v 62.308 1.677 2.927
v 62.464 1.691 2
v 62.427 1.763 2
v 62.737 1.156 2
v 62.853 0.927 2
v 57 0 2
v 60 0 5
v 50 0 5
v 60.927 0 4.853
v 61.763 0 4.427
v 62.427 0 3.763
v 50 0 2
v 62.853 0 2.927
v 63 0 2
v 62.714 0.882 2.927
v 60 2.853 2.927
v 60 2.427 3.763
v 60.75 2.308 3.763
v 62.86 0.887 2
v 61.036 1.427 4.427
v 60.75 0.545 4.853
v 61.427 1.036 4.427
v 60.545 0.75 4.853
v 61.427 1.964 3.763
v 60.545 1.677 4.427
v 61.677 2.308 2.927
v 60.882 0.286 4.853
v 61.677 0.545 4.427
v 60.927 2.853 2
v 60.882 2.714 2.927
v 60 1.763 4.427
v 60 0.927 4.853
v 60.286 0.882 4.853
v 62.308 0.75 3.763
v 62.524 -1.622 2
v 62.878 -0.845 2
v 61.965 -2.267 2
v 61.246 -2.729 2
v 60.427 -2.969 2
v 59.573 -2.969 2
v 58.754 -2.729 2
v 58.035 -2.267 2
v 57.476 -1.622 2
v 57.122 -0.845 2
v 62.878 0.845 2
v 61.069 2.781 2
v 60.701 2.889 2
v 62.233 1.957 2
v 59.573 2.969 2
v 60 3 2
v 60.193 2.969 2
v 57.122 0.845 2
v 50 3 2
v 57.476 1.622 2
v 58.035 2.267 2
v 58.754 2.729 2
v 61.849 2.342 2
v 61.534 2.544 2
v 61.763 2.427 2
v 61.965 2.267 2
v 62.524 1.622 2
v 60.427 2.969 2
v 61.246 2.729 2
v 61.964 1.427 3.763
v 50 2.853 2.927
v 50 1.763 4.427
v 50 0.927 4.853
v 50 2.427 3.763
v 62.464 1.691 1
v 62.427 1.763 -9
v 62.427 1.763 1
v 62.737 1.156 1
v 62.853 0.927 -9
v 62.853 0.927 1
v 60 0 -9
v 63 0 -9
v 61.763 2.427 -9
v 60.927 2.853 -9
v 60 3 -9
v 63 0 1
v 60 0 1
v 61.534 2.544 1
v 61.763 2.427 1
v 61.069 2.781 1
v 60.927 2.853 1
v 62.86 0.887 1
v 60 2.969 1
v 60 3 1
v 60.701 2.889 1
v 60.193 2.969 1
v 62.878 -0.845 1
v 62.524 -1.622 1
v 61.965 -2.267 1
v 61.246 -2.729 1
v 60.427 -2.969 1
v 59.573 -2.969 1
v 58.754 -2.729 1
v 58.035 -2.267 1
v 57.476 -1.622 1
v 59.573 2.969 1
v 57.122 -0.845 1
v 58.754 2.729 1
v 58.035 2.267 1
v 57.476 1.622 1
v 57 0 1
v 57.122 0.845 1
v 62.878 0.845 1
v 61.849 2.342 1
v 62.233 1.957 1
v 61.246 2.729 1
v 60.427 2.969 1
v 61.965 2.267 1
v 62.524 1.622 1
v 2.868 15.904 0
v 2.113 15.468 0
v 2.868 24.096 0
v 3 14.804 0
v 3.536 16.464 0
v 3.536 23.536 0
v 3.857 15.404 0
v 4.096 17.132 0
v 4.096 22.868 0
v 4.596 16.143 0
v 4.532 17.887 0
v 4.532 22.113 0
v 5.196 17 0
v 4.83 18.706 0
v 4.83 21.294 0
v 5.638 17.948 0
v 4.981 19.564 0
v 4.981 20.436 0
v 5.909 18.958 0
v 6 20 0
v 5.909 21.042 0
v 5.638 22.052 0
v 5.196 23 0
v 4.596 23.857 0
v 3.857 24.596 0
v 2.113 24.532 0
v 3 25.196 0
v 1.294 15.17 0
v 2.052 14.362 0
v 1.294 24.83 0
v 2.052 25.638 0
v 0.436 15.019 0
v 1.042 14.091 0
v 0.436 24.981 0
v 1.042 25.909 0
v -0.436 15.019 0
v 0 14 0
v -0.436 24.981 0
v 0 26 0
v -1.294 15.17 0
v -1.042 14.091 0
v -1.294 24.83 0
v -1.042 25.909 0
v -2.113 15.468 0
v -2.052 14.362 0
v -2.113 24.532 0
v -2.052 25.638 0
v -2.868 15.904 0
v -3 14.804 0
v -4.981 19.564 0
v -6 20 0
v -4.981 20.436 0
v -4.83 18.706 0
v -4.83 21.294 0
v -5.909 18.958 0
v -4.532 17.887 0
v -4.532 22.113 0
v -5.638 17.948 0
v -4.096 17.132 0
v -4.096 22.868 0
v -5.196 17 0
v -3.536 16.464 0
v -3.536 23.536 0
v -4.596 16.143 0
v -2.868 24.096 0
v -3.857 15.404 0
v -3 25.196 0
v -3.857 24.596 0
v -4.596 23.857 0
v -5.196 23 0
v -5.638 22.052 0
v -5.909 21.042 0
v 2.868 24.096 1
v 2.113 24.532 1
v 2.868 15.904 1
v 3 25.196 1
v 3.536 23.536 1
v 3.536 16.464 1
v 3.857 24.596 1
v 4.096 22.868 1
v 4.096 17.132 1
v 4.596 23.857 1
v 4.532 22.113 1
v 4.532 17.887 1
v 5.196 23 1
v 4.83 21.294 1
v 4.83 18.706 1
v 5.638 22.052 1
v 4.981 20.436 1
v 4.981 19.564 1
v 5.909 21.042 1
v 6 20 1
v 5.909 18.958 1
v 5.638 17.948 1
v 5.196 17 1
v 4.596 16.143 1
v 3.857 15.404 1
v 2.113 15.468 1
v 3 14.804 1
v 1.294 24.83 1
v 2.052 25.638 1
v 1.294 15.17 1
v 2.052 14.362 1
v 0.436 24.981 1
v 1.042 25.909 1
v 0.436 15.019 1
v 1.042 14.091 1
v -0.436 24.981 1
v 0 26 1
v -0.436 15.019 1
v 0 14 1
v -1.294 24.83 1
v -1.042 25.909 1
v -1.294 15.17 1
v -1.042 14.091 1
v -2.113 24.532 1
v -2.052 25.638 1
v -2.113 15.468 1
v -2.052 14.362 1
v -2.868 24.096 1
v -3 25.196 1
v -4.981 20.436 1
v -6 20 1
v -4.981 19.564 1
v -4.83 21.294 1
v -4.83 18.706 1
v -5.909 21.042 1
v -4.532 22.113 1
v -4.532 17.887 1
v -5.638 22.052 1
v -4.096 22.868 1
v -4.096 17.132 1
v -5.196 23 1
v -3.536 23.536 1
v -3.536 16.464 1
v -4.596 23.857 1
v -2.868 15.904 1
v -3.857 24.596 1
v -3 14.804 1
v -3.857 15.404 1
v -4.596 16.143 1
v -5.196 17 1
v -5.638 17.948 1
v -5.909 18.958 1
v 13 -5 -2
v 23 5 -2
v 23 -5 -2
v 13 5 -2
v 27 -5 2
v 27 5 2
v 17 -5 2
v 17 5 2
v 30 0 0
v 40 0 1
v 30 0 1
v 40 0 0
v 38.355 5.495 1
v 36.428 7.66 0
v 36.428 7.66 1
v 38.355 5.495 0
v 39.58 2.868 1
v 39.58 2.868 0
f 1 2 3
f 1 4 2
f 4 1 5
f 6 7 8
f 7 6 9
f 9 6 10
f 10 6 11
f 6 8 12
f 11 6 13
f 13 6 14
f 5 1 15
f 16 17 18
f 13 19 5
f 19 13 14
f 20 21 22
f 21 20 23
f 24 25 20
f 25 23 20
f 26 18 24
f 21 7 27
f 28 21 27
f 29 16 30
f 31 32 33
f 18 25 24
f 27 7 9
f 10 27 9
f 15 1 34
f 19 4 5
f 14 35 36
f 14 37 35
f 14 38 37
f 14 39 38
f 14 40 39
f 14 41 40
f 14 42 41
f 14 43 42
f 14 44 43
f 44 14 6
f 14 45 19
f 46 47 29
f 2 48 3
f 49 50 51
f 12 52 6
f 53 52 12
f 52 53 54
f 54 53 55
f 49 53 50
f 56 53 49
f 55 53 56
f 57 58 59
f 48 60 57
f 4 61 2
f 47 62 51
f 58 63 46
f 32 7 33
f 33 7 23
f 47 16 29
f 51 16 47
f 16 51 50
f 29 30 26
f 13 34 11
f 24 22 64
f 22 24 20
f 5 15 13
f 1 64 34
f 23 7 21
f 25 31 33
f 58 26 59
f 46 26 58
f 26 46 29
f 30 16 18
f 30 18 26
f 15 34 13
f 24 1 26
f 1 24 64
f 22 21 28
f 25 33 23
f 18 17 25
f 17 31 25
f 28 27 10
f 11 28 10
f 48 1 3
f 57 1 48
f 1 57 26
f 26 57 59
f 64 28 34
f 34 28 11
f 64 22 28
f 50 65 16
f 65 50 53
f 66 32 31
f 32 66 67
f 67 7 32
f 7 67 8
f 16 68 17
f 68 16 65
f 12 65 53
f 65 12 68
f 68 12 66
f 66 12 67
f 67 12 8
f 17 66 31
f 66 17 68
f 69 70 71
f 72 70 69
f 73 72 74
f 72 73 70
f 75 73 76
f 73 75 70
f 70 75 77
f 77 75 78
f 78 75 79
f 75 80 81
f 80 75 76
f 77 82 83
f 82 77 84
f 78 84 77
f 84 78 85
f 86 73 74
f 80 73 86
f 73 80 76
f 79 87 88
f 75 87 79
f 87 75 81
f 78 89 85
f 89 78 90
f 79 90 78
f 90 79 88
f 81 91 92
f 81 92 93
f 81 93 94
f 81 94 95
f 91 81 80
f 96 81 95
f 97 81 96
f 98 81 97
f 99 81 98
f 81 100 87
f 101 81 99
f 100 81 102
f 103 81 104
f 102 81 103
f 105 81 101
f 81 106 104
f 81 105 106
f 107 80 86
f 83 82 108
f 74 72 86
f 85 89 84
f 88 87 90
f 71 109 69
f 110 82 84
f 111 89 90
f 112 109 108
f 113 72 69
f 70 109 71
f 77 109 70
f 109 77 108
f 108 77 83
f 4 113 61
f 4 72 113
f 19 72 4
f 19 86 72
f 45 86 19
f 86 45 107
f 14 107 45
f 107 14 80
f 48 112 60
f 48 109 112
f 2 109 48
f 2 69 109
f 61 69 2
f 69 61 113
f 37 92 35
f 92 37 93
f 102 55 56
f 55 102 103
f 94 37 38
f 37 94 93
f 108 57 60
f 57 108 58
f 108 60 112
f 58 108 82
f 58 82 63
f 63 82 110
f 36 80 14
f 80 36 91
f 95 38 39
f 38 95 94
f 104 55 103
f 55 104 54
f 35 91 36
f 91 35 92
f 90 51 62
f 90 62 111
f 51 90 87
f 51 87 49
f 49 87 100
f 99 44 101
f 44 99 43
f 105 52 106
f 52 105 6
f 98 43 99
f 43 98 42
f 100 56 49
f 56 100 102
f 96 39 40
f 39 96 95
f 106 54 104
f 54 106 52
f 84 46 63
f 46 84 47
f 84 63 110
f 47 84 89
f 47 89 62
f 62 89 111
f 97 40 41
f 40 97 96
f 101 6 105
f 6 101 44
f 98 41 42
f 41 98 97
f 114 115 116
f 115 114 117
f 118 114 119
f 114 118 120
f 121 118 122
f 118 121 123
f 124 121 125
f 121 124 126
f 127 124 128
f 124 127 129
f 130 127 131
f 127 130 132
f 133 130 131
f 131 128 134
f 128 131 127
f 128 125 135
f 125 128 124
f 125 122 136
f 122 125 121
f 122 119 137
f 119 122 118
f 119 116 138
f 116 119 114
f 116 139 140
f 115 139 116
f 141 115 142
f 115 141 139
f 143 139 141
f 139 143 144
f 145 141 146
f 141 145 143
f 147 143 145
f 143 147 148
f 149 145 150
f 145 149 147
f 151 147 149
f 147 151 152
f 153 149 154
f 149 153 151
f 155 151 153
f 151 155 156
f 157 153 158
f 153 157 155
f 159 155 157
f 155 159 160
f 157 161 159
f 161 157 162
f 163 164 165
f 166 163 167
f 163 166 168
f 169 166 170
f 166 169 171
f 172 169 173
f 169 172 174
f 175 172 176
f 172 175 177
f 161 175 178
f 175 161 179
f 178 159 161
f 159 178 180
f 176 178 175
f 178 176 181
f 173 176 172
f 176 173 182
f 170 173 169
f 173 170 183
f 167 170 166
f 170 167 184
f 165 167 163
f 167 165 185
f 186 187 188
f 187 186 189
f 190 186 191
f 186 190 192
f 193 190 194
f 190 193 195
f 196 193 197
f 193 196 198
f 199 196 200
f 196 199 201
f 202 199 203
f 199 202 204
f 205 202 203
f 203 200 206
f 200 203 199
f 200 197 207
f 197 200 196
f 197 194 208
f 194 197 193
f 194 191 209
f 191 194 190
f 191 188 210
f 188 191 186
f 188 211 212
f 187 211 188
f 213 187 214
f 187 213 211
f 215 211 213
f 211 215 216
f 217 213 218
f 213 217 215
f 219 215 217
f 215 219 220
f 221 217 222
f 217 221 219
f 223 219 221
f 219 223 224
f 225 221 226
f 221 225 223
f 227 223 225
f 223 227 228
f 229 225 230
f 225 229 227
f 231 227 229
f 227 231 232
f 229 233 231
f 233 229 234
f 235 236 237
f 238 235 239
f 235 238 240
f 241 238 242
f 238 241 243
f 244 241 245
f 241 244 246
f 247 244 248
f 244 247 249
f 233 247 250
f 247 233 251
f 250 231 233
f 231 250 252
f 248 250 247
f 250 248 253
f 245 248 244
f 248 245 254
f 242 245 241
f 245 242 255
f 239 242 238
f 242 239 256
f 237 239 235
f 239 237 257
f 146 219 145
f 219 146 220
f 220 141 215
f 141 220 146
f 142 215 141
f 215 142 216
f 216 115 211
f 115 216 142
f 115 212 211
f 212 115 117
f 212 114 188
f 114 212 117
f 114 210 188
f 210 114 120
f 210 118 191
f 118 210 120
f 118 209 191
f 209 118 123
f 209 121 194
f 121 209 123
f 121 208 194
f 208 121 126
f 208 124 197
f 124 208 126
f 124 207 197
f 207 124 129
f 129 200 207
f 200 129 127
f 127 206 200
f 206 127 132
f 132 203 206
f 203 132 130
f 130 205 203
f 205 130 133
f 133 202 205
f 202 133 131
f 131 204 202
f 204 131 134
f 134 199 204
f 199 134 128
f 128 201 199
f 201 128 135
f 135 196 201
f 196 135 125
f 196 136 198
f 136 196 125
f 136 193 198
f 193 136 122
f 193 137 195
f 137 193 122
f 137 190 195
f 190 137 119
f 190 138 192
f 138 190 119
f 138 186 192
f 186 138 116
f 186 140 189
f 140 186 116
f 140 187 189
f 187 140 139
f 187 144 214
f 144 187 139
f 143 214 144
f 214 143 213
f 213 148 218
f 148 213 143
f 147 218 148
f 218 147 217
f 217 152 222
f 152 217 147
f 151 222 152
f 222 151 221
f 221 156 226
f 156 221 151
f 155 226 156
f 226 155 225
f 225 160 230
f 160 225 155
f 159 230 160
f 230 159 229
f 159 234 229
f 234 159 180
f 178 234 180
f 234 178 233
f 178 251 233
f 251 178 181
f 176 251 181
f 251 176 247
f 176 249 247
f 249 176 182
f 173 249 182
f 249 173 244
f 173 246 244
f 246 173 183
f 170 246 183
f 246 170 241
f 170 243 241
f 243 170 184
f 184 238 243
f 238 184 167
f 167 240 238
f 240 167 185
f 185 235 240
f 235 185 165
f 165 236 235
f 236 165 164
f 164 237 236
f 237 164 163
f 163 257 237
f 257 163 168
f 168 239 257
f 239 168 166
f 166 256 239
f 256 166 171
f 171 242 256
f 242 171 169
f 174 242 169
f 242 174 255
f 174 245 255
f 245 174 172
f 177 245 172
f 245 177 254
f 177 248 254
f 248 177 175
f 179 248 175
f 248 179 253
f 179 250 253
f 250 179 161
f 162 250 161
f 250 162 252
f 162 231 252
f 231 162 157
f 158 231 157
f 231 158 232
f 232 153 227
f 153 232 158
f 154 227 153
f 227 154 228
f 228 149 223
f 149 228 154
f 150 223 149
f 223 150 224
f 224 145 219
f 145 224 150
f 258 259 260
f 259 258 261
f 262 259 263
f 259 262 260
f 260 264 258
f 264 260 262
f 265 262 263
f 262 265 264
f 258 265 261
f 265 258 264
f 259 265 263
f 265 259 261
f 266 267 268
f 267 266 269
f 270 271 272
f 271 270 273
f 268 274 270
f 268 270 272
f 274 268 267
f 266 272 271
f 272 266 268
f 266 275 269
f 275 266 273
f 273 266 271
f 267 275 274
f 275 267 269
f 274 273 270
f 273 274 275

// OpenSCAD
translate([0,20,0]) linear_extrude(1) star(N=36,ri=5,re=6);
translate([20,0,0]) skewedCube([10,10,4],[45,0],center=true);
translate([30,0,0]) linear_extrude(1)  arc(r=10, angle=50);
translate([30,30,0]) rotate_extrude() rotate(30) arc(r=10, angle=60);
circFromPoints([[56,32],[61,17],[50,30]],true);
translate([0,0,0]) nGon();
translate([20,20,0]) beanShape(d1=10,d2=7,r=5,dist=10);

//-- compare facet handling of arc with rotate_extrude
//$fs=0.2;


translate([60,0,2]){
   $fn=ceil(rands(0,50,1)[0]);
   color("red") rotate_extrude(angle=90) arc(3,90);
   color("lightblue") rotate([0,-90,0]) rotate_extrude(angle=90) square([3,10]);
   color("lightblue") translate([0,0,-11]) rotate_extrude(angle=90) square([3,10]);
   color("green") translate([0,0,-1]) cylinder(r=3,h=1);
}
/* -- openSCAD's calculation of fragments in a circle
fn: total number of fragments
fa: minimum angle per fragment
fs: minimum size of a fragment

int get_fragments_from_r(double r, double fn, double fs, double fa)
      {
             if (r < GRID_FINE) return 3;
             if (fn > 0.0) return (int)(fn >= 3 ? fn : 3);
             return (int)ceil(fmax(fmin(360.0 / fa, r*2*M_PI / fs), 5));
      }
      defaults: $fn=0; $fa=12, $fs=2
*/
$fn=20;
*rndCube();
module rndCube(size=[1,1,1],rad=0.1,center=false){
  //"for (ix,iy,iz) hull() - sphere()" is very unefficient
  cntrOffset= center ? [0,0,0] : size/2;
  prtRad= (min(size)<=rad*2) ? min(size)/2 : rad; //limit radius to half of shortest side

  translate(cntrOffset) 
   hull() for (ix=[0,1],iy=[0,1],iz=[0,1]){ 
    mirror ([ix,0,0]) mirror([0,iy,0]) mirror([0,0,iz]) 
      translate([(size.x/2-prtRad),(size.y/2-prtRad),(size.z/2-prtRad)]) 
        rotate_extrude(angle=90) arc(prtRad,90);
  }
}


module rndCubeSlow(size=[1,3,3], rad=1.5, center=false){
  //rounded cube
  cntrOffset= center ? [0,0,0] : size/2;
  prtRad= (min(size)<rad) ? min(size)/2 : rad; //limit radius to half of shortest side

  translate(cntrOffset) hull() for (ix=[-1,1], iy=[-1,1], iz=[-1,1])
    translate([ix*(size.x/2-prtRad),iy*(size.y/2-prtRad),iz*(size.z/2-prtRad)]) sphere(prtRad);
}

*rndRect(center=true);
module rndRect(size=[10,10], rad=1, center=false){
  /* square or cube with rounded corners
 accepts 2 or 3 Dimensions 
  */
  if (len(size)==3){
    cntrOffset= center ? [0,0,0] : size/2;    
    hull() for(ix=[-1,1],iy=[-1,1])
      translate([ix*(size.x/2-rad),iy*(size.y/2-rad),0]+cntrOffset) cylinder(r=rad,h=size.z,center=true);
  }
  else{
    cntrOffset= center ? [0,0] : size/2;    
    hull() for(ix=[-1,1],iy=[-1,1])
      translate([ix*(size.x/2-rad),iy*(size.y/2-rad)]+cntrOffset) circle(r=rad);
  }
}

//draw an arc with 2 radiusses
//$fn=50;
*arcDualRad(73,15,12,50);
module arcDualRad(r1,r2,angle1,angle2){
/* two arcs with tangential transistion
/  give: center(M1) and radius(r1) of first arc
/        radius(r2) of 2nd arc
/        angle of both arc segments(alpha1,alpha2)
*/
  //if (M1.x<0) assert("ERROR","x-Values needs to be positive")
  
  alpha=90-angle1;
  M2=[sin(alpha)*(r1-r2),cos(alpha)*(r1-r2)];

  //draw two arcs
  *translate(M1) arc(r1,angle1);
  *translate(M2) rotate(angle1) arc(r2,angle2);
  //calculate fragments for each arc
  n1=arcFragments(r1,angle1);
  n2=arcFragments(r2,angle2);
  //generate Polygons
  arc1Poly=arcPoints(r1,angle1,n1,poly=[]);
  arc2Poly=translatePoints(rotatePoints(arcPoints(r2,angle2,n2,poly=[]),angle1) ,M2);
  //combine and draw polygons
  polygon(concat([[0,0]],arc2Poly,arc1Poly));
  
}

module calcFacets(r=5){
  echo(r=r,n=($fn>0?($fn>=3?$fn:3):ceil(max(min(360/$fa,r*2*PI/$fs),5))),a_based=360/$fa,s_based=r*2*PI/$fs);
}

module arc(r=1,angle=60){
  //draws a closed arc shape from zero to target angle 
  //with same amount of fragments rotate_extrude(angle) would produce but with 2D output

  n= arcFragments(r,angle);
  polygon(arcPoints(r,angle,n));
}


//ri is inner radius and re is outer radius
module star(N=5, ri=15, re=30) {
    polygon([
        for (n = [0 : N-1], in = [true, false])
            in ? 
                [ri*cos(-360*n/N + 360/(N*2)), ri*sin(-360*n/N + 360/(N*2))] :
                [re*cos(-360*n/N), re*sin(-360*n/N)]
    ]);
}

//n-Gon from side length
*nGon();
module nGon(N=5, S=10) {
  //https://calcresource.com/geom-ngon.html
  theta=360/N;
  rc=S/(2*sin(theta/2));
    polygon([
        for (n = [0 : N-1])
                [rc*cos(-360*n/N), rc*sin(-360*n/N)]
    ]);
}

module skewedCube(size=[1,1,1],skew=[45,45],center=false){
  skwDstX= tan(skew.x) ? size.z/tan(skew.x) : 0;
  skwDstY= tan(skew.y) ? size.z/tan(skew.y) : 0;
  skewDist= [skwDstX,skwDstY];
  centerOffset= center ? [-(size.x+skewDist.x)/2,-(size.x+skewDist.y)/2,-size.z/2]: [0,0,0];
  
  polys= // -- bottom --
         [[0,0,0],          //0
         [size.x,0,0],      //1
         [size.x,size.y,0], //2
         [0,size.y,0],      //3
         // -- top --
         [skewDist.x,skewDist.y,size.z],             //4
         [size.x+skewDist.x,skewDist.y,size.z],      //5
         [size.x+skewDist.x,size.y+skewDist.y,size.z], //6
         [skewDist.x,size.y+skewDist.y,size.z]];       //7
  
  faces=[[0,1,2,3],  // bottom
  [4,5,1,0],  // front
  [7,6,5,4],  // top
  [5,6,2,1],  // right
  [6,7,3,2],  // back
  [7,4,0,3]]; // left
  
  translate(centerOffset) polyhedron(polys,faces);
}

// give two or three 2D points to draw a circle
module circFromPoints(points=[],debug=false){
  //using trigonometric approach from
  //https://www.weltderfertigung.de/suchen/lernen/mathematik/punktberechnung-kreismittelpunkt-und-radius.php
  p1=points[0];
  p2=points[1];
  p3=points[2];

  //first triangle from 2 points
  a1=p2.y-p1.y;
  b1=p2.x-p1.x;
  c1=norm(p1-p2); //diameter of first circle

  //center of circle from 2 points
  M1=[p1.x+b1/2,p1.y+a1/2];
  
  //done when only 2 points are given
  if (len(points)==2)
    translate(M1) circle(c/2);

  else{ //continue with radius and center from 3 points
    M=centerFrom3P(points);
    r=radiusFrom3P(points);
    //r=norm(p1-M); //distance between center and one of the points
    translate(M) circle(r);
    if (debug) echo(str("radius: ",r,"\n center: ",M));
  }

  if (debug){
    color("red") translate(p1) circle();
    color("red") translate(p2) circle();
    if (p3) color("red") translate(p3) circle();
   
  }
}

module beanShape(d1=70,d2=50,r=50,dist=70){
  //two circles connected by tangential radius
  //a²=b²+c²-2*b*c*cos(alpha)
  a=r+d2/2;
  b=r+d1/2;
  c=dist;
  alpha=acos((a^2-b^2-c^2)/(-2*b*c));
  beta=acos((b^2-a^2-c^2)/(-2*a*c));
  echo(beta);
  
  Prad=[cos(alpha)*b,sin(alpha)*b];
  P1=[cos(alpha)*d1/2,sin(alpha)*d1/2];
  P2=[-cos(beta)*d2/2,sin(beta)*d2/2];
  
  difference(){
    union(){
      circle(d=d1);
      translate([dist,0]) circle(d=d2);
      polygon([P1,[P2.x+dist,P2.y],[P2.x+dist,-P2.y],[P1.x,-P1.y]]);
    }
    translate(Prad) circle(r);
    translate([Prad.x,-Prad.y]) circle(r);
  }
}


// --- functions ---

function centerFrom3P(points=[])=
//using trigonometric approach from
//https://www.weltderfertigung.de/suchen/lernen/mathematik/punktberechnung-kreismittelpunkt-und-radius.php

  let(
    p1=points[0],
    p2=points[1],
    p3=points[2],

    //first triangle from 2 points
    a1=p2.y-p1.y,
    b1=p2.x-p1.x,
    c1=norm(p1-p2), //diameter of first circle

    //center of circle from 2 points
    M1=[p1.x+b1/2,p1.y+a1/2],

    a2=p3.y-p1.y,
    b2=p3.x-p1.x,
    c2=norm(p1-p3), //diameter of 2nd circle
    M2=[p1.x+b2/2,p1.y+a2/2],

    a3=p3.y-p2.y,
    b3=p3.x-p2.x,

    M3=[p2.x+b3/2,p2.y+a3/2],

    W1=atan2(a1,b1),
    W2=atan2((M3.y-M1.y),(M3.x-M1.x)),
    W3=atan2((p2.y-M3.y),(p3.x-M3.x)),
    W4=atan2((M3.y-M1.y),(M3.x-M1.x)),

    beta=90-(W1-W2),
    gamma=90-W3-W4,
    alpha=180-beta-gamma,
    a=norm(M3-M1),
    c=(a*sin(gamma))/sin(alpha),
    alpha2=90-(beta-W2),
    M1M=[sin(alpha2)*c,cos(alpha2)*c]//Offset between M1 and M
  ) [M1.x+M1M.x,M1.y-M1M.y]; //M

echo(radiusFrom3P([[-48.08,-19.65],[-50.38, -20.86],[ -52.50, -25.43]]));

function radiusFrom3P(points)=
  norm(points[0]-centerFrom3P(points));

function angleFrom2P(points,radius=1)=
  2*asin(norm(points[0]-points[1])/(2*radius));

//arc with constant radius
function arcPoints(r=1,angle=60,steps=10,poly=[[0,0]],iter)=
  let(
    iter = (iter == undef) ? steps-1 : iter,
    angInc=angle/(steps-1), //increment per step
    x= r*cos(angInc*iter),
    y= r*sin(angInc*iter)
  )(iter>=0) ? arcPoints(r,angle,steps,concat(poly,[[x,y]]),iter-1) : poly;

*offset(3) union(){
  polygon(arcPointsLinear(3,6,180,30));
  rotate(180) polygon(arcPointsLinear(6,3,180,30));
}

//arc with linear radius change
function arcPointsLinear(r1=1, r2=2,angle=60,steps=10,poly=[[0,0]],iter)=
  let(
    iter = (iter == undef) ? steps-1 : iter,
    r=r1+((r2-r1)/(steps-1))*iter,
    angInc=angle/(steps-1), //increment per step
    x= r*cos(angInc*iter),
    y= r*sin(angInc*iter)
  )(iter>=0) ? arcPointsLinear(r1,r2,angle,steps,concat(poly,[[x,y]]),iter-1) : poly;

//calculate fragments from radius and angle and $fn,$fs etc.
function arcFragments(r,angle)=
  let(
    cirFrac=360/angle, //fraction of angle
    frgFrmFn= floor($fn/cirFrac), //fragments for arc calculated from fn
    minFrag=3 //minimum Fragments
  ) ($fn>minFrag) ? max(frgFrmFn,minFrag)+1 : ceil(max(min(angle/$fa,r*(2*PI/cirFrac)/$fs),minFrag));


function translatePoints(points=[[0,0],[1,1]],vector=[2,2],output=[],iter)=
  let(
    iter=(iter == undef) ? 0 : iter
  )
  (iter<=len(points)-1) ? translatePoints(points,vector,concat(output,[points[iter]+vector]),iter=iter+1) : output;

*echo(rotatePoints());
function rotatePoints(points=[[0,0],[1,1],[5,5]],angle=90,output=[],iter)=
  let(
    iter=(iter == undef) ? 0 : iter,
    x2= cos(angle)*points[iter].x-sin(angle)*points[iter].y,
    y2= sin(angle)*points[iter].x+cos(angle)*points[iter].y
  )
  (iter<len(points)-1) ? rotatePoints(points,angle,concat(output,[[x2,y2]]),iter=iter+1) : concat(output,[[x2,y2]]);

*echo(str("fact: ",fact(5)));
function fact(n,result=1)= n ? fact((n-1),n*result)  : result;

//calculate two centers from two points and a radius
function c_centers(P1, P2, r)= let(
  q = sqrt(pow((P2.x-P1.x),2) + pow((P2.y-P1.y),2)),
  x3 = (P1.x + P2.x) /2,
  y3 = (P1.y + P2.y) /2,
  xx = sqrt((pow(r,2) - pow(q/2,2)))*(P1.y-P2.y)/q,
  yy = sqrt((pow(r,2) - pow(q/2,2)))*(P2.x-P1.x)/q
) [[x3 + xx, y3+yy], [x3-xx,y3-yy]];
